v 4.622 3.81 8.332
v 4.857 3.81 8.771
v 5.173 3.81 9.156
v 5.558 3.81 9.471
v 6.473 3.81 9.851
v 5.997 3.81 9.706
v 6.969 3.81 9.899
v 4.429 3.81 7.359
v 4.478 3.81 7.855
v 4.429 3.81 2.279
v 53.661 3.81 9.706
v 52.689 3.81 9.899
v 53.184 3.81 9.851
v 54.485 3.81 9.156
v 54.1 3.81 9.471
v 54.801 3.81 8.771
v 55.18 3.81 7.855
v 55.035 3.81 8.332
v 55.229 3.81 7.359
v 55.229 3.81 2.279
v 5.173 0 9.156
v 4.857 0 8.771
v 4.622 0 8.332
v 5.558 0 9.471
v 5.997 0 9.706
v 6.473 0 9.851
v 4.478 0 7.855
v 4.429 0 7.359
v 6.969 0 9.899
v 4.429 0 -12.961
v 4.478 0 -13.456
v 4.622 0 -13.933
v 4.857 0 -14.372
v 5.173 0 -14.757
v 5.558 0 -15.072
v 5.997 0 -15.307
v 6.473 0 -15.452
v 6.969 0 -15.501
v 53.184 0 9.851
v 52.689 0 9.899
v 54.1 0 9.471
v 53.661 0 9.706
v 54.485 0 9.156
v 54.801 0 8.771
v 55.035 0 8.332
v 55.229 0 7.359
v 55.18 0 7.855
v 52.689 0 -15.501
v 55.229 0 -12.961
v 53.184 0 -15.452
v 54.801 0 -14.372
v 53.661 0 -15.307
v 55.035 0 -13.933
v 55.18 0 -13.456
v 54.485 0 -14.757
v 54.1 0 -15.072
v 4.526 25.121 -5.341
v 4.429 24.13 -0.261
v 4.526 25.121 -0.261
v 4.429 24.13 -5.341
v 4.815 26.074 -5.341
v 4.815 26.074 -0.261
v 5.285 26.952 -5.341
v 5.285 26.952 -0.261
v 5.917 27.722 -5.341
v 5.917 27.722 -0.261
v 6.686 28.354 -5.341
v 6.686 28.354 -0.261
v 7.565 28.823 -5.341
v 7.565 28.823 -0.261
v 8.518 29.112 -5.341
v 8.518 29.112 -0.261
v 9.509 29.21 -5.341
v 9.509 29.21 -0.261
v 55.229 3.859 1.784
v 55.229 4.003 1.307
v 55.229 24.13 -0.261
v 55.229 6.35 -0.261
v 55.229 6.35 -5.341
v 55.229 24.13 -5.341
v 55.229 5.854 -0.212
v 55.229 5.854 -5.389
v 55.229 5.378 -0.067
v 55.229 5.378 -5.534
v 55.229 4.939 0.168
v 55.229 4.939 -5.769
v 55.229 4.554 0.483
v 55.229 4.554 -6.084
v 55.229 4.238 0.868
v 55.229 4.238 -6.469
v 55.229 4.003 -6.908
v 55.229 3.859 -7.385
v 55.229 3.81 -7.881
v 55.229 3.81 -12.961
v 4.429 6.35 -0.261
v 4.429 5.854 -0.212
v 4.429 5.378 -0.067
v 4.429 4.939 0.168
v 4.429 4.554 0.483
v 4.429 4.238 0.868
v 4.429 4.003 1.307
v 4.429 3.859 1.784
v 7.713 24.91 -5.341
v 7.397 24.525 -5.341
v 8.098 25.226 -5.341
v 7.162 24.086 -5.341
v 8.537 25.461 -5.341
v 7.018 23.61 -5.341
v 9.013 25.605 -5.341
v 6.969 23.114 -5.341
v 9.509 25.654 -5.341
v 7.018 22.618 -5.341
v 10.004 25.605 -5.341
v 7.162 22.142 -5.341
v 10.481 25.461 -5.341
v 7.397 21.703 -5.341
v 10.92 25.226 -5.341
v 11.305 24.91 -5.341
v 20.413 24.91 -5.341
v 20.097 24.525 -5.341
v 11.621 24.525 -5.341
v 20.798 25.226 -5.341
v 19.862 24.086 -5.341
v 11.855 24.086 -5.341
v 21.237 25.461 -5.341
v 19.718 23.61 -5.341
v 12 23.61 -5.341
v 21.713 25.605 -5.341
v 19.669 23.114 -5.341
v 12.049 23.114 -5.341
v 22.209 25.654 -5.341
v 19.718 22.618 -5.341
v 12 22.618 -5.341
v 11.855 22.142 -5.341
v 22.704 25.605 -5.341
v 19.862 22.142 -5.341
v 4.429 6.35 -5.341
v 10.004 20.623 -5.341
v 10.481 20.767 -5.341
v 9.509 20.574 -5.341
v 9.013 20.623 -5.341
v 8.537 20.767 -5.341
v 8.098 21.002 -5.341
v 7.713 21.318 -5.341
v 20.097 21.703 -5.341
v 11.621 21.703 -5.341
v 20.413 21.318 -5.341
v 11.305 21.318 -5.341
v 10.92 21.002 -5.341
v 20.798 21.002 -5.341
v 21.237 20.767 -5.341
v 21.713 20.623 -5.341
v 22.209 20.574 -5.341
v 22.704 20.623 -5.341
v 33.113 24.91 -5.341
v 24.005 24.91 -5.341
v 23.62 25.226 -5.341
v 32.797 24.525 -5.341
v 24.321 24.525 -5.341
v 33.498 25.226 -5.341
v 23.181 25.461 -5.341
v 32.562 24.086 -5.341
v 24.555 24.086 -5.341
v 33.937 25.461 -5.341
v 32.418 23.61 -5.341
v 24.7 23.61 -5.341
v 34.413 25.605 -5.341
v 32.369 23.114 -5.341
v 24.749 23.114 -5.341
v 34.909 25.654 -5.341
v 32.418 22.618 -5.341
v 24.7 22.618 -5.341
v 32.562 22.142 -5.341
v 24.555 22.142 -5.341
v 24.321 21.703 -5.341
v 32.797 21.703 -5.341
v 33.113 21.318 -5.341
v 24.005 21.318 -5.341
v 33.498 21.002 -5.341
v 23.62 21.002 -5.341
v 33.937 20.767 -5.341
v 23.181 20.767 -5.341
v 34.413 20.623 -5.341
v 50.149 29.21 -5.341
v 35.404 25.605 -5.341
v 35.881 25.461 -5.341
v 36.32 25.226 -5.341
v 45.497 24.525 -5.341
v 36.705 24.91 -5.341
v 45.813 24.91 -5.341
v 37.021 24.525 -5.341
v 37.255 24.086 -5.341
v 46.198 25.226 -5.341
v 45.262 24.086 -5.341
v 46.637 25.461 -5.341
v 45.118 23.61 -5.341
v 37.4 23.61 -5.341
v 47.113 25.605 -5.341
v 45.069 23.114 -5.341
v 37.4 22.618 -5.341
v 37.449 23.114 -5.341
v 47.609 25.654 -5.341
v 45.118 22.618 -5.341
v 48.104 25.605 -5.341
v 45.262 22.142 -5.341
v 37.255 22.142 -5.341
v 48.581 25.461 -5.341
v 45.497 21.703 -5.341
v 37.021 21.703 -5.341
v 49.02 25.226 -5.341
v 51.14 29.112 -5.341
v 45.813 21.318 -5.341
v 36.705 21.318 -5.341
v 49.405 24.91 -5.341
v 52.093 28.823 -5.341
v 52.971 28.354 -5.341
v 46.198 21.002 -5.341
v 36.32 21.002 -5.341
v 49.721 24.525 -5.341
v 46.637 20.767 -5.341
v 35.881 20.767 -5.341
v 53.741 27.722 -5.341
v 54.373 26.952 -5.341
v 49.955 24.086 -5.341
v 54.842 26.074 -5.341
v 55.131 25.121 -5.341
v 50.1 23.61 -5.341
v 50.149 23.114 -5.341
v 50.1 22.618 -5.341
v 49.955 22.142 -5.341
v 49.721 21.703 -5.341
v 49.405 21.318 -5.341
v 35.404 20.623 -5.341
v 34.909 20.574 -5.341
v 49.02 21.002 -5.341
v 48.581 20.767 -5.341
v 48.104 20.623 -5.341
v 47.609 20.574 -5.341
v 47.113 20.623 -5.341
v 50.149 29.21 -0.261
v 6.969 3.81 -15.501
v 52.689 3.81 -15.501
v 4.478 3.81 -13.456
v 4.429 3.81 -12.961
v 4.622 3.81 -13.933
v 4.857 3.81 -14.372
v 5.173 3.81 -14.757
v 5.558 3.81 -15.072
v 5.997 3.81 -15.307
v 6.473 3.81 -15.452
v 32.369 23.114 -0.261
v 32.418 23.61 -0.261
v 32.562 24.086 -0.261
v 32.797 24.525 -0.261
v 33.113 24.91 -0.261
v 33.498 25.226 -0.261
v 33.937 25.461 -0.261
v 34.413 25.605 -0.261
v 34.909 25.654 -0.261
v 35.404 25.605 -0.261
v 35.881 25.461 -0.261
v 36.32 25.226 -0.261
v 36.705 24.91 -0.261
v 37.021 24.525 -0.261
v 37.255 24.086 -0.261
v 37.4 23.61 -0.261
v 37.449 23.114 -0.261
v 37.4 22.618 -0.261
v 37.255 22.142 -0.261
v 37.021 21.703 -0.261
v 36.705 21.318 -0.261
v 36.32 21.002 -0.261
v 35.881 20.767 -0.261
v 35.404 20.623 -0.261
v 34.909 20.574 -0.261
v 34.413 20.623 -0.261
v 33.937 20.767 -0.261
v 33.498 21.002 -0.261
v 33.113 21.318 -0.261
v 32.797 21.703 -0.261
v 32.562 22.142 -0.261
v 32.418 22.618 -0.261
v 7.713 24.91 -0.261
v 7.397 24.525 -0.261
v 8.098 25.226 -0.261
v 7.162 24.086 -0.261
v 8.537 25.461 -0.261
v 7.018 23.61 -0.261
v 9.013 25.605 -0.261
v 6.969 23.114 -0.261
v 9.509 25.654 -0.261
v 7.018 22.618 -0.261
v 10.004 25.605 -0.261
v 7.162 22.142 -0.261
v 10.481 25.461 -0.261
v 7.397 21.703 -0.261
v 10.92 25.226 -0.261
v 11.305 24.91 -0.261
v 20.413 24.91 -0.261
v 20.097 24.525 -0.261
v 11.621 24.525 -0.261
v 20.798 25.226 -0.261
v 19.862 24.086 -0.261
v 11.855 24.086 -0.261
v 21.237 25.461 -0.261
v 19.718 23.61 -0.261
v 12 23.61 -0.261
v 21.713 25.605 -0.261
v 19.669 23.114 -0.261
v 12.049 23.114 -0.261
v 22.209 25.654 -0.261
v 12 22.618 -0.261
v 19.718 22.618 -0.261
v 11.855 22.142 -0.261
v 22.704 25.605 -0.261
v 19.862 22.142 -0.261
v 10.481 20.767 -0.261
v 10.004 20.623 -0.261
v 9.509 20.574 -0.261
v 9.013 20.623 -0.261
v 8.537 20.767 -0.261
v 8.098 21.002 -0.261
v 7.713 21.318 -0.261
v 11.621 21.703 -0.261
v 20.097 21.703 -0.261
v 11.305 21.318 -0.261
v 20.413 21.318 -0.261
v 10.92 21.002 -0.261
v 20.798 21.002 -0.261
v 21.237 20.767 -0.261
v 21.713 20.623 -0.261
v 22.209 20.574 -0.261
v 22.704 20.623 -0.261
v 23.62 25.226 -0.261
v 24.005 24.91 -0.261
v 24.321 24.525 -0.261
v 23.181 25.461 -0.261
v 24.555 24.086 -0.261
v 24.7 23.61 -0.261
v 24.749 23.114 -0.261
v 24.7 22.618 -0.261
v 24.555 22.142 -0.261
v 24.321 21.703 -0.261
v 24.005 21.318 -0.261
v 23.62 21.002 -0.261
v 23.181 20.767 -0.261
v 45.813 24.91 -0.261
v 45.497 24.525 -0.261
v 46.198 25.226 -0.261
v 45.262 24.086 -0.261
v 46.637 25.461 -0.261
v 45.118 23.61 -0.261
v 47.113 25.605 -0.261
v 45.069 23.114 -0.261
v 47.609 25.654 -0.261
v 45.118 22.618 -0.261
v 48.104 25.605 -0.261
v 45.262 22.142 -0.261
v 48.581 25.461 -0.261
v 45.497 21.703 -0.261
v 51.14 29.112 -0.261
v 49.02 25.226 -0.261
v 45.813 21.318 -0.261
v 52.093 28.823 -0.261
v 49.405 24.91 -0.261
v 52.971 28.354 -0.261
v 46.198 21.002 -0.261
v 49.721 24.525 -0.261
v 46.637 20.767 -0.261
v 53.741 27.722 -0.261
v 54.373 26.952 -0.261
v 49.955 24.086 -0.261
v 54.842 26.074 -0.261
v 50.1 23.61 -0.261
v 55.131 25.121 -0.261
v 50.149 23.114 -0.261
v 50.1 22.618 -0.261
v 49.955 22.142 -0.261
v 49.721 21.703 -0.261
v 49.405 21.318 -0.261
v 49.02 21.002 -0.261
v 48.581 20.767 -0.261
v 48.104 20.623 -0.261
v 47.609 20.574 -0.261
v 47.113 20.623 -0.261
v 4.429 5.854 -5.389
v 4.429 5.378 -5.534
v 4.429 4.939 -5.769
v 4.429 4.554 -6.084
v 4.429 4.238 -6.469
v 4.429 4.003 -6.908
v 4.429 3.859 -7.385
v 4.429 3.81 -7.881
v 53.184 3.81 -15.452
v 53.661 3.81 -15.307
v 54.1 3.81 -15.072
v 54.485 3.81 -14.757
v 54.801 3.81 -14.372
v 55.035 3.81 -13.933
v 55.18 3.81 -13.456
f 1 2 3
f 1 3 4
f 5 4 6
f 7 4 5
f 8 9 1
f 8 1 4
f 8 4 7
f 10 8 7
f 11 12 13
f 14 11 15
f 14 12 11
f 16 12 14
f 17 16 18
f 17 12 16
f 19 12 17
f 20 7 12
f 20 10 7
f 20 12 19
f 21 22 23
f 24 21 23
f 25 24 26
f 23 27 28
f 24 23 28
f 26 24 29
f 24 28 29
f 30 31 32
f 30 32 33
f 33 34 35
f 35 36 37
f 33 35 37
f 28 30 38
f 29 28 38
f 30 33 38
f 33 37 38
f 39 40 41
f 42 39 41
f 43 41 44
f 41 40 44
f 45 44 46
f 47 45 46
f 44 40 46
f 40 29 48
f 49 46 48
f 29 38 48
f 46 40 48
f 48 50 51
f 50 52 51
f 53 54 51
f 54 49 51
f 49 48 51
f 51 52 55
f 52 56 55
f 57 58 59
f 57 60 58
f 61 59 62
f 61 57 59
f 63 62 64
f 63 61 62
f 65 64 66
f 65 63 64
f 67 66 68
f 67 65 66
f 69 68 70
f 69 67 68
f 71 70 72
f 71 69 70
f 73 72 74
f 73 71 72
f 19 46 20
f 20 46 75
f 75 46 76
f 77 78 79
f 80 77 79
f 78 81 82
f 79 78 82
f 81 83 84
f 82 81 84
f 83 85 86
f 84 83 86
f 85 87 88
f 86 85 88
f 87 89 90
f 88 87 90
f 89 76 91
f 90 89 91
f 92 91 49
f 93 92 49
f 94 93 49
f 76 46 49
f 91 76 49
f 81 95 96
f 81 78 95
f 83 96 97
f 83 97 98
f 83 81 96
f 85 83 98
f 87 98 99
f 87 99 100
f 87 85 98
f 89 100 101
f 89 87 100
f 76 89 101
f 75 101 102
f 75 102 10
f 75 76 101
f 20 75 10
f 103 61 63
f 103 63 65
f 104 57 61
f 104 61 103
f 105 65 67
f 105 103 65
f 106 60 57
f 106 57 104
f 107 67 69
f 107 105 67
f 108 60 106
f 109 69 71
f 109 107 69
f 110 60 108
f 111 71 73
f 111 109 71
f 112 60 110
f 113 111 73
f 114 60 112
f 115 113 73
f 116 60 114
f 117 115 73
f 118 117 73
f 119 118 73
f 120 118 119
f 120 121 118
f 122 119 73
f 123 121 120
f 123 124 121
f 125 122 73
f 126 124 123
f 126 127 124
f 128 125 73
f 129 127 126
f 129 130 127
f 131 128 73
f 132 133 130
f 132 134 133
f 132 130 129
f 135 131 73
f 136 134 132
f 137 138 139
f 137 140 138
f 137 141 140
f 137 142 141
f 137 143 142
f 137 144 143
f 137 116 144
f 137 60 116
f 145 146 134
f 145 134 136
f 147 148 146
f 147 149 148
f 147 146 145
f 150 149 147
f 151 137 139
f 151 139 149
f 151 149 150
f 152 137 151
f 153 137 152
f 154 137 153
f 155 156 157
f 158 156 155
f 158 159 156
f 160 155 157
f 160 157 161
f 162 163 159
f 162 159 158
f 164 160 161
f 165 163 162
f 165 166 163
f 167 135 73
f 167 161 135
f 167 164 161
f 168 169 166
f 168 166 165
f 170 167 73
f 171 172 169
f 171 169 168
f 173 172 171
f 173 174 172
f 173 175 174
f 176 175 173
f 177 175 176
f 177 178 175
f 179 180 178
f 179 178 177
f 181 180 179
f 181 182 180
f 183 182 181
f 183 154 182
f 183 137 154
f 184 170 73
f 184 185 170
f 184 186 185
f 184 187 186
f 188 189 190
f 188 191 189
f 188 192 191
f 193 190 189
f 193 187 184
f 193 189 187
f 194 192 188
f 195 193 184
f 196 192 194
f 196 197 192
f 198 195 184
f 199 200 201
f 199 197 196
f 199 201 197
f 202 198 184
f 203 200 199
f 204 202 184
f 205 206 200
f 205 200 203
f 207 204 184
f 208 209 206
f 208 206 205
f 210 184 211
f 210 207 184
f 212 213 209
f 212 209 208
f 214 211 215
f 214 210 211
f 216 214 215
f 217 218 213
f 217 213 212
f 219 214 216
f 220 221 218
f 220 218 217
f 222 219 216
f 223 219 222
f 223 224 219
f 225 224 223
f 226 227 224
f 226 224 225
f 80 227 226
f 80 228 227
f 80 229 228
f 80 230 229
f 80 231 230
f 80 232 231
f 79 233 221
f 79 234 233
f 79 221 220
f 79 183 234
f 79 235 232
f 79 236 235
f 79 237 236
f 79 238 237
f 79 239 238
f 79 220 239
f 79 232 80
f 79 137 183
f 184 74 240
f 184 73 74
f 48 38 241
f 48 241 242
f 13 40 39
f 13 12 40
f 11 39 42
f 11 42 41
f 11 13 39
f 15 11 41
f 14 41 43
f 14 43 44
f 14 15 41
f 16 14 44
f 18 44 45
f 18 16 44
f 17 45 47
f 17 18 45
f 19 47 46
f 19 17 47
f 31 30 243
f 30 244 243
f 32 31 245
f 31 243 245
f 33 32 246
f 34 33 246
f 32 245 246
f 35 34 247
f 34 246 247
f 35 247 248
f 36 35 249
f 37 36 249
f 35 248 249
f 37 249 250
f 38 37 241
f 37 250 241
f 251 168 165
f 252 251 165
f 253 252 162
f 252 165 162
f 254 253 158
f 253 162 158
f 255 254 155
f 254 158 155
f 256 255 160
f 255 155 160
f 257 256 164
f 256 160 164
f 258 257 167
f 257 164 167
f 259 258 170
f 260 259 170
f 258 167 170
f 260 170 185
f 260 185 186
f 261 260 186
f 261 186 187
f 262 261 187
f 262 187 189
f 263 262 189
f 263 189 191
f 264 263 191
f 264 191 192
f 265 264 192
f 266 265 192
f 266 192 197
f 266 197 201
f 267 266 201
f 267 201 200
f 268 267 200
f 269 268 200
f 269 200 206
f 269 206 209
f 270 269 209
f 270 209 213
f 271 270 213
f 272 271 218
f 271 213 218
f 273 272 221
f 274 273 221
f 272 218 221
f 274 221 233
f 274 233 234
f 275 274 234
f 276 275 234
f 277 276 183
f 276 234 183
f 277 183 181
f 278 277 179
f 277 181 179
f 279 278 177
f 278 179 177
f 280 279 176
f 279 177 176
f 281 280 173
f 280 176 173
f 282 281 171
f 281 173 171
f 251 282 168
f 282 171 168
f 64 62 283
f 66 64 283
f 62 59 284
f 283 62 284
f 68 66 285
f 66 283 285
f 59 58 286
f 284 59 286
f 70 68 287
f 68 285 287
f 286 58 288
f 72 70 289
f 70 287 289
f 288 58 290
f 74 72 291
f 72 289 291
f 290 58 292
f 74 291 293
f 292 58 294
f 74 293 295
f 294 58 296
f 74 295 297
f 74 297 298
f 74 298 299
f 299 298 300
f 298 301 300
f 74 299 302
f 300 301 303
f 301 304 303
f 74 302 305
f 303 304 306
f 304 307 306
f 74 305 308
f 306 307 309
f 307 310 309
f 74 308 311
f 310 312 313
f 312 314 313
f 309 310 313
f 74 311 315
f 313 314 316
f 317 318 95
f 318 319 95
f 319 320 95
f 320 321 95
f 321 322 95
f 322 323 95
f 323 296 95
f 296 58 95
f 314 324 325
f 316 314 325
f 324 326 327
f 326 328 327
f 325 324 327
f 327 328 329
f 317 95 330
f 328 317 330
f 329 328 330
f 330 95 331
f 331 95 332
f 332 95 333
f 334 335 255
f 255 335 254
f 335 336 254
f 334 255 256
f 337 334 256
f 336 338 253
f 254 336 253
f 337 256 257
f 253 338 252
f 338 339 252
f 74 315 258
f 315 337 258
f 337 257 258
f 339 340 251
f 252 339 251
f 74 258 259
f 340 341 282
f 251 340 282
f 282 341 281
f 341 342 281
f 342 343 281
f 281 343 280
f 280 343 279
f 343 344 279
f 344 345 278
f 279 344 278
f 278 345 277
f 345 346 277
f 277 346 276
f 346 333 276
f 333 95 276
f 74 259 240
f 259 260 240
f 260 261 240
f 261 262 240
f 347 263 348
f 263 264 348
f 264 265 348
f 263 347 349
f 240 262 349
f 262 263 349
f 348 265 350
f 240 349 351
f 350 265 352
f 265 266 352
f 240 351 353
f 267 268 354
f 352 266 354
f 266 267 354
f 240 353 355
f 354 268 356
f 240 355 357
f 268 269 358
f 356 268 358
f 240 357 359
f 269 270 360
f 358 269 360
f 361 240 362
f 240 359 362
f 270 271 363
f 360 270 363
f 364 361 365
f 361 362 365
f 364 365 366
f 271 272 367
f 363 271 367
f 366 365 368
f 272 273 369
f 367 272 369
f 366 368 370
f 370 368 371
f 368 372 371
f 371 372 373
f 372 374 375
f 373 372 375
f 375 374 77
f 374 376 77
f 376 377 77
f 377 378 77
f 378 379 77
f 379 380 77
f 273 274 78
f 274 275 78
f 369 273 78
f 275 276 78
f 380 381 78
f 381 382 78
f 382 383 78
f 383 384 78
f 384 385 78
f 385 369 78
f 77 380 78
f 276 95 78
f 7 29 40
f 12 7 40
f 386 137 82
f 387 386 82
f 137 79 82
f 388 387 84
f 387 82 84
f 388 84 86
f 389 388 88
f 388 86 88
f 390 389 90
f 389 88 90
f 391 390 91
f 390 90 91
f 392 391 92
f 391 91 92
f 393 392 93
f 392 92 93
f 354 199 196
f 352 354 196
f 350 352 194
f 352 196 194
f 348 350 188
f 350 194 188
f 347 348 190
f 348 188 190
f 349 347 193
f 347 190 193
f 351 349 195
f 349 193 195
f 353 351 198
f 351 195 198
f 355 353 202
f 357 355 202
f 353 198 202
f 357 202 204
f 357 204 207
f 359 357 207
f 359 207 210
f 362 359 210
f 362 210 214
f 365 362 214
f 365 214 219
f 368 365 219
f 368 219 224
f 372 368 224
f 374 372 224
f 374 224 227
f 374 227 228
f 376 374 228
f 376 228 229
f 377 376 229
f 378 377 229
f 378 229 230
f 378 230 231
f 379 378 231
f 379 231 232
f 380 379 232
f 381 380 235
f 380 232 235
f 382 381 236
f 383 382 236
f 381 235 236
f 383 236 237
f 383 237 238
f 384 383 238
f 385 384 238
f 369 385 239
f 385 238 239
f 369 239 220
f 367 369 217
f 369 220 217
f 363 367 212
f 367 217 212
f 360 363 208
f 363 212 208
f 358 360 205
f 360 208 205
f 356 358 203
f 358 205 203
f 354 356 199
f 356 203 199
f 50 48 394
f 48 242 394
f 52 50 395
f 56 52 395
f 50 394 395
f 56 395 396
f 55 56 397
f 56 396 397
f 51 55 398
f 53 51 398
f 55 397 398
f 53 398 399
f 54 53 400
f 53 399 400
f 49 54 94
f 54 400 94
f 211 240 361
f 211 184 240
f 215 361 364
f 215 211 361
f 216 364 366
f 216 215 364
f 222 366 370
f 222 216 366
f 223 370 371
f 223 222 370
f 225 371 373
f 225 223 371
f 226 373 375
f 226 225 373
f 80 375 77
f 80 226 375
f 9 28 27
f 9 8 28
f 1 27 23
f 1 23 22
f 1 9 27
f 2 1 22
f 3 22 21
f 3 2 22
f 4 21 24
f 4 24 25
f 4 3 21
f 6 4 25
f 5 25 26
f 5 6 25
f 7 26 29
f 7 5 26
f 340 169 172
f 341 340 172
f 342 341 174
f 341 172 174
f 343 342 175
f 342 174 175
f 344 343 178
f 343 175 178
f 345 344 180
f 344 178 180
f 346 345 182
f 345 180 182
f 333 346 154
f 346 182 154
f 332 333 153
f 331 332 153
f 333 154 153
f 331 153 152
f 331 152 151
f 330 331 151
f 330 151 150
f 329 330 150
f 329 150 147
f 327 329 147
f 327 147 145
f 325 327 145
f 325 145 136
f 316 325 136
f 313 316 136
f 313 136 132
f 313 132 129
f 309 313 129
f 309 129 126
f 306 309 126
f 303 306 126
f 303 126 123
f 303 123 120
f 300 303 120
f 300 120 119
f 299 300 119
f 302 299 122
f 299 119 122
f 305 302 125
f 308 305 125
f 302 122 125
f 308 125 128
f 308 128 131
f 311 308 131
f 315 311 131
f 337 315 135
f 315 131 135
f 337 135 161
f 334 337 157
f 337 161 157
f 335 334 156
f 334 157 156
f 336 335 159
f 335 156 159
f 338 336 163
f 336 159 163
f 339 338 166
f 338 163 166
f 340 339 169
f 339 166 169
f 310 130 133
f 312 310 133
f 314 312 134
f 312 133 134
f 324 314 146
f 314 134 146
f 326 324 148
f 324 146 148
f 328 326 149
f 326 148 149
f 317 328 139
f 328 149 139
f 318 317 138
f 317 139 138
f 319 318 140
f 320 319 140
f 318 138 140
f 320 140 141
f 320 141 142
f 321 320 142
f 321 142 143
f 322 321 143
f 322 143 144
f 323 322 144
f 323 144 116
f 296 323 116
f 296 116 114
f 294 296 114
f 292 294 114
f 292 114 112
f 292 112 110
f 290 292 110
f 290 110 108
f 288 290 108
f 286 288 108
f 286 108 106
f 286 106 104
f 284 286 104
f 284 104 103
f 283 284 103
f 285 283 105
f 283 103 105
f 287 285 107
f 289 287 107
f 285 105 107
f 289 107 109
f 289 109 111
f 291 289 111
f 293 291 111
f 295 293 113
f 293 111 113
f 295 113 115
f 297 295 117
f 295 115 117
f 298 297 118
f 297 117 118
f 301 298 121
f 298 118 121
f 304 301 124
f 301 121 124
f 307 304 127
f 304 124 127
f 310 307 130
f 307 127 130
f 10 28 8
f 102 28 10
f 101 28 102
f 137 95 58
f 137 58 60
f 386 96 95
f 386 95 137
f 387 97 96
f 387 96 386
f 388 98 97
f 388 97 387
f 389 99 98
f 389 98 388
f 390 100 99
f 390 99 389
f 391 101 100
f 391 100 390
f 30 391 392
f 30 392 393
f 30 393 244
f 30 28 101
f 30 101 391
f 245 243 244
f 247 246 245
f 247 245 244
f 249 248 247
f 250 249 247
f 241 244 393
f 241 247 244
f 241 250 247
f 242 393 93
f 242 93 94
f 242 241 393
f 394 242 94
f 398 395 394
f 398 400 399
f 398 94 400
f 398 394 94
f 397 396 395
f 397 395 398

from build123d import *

# Parameters (mm, degrees)
SKETCH1_W           = 50.8
SKETCH1_H           = 25.4
BOSS_EXTRUDE1_DEPTH = 3.81
SKETCH2_W           = 50.8
SKETCH2_H           = 5.08
BOSS_EXTRUDE2_DEPTH = 25.4
CUT_EXTRUDE1_DEPTH  = 25.4
FILLET1_R           = 5.08
FILLET2_R           = 2.54
FILLET3_R           = 2.54


with BuildPart() as part:
    # Sketch1 → Boss-Extrude1 (new body)
    with BuildSketch(Plane(origin=(0, 0, 0), x_dir=(1, 0, 0), z_dir=(0, 1, 0))):
        with Locations((29.828717949, 2.800512821)):
            Rectangle(SKETCH1_W, SKETCH1_H)
    extrude(amount=BOSS_EXTRUDE1_DEPTH)

    # Sketch2 → Boss-Extrude2 (add)
    with BuildSketch(Plane(origin=(0, 3.81, 0), x_dir=(1, 0, 0), z_dir=(0, 1, 0))):
        with Locations((29.828717949, 2.800512821)):
            Rectangle(SKETCH2_W, SKETCH2_H)
    extrude(amount=BOSS_EXTRUDE2_DEPTH)

    # Sketch3 → Cut-Extrude1 (cut)
    with BuildSketch(Plane(origin=(0, 0, -5.340512821), x_dir=(-1, 0, 0), z_dir=(0, 0, -1))):
        with BuildLine():
            ThreePointArc((-6.968717949, 23.114), (-9.508717949, 25.654), (-12.048717949, 23.114))
            Line((-12.048717949, 23.114), (-6.968717949, 23.114))
        make_face()
        with BuildLine():
            Line((-6.968717949, 23.114), (-12.048717949, 23.114))
            ThreePointArc((-12.048717949, 23.114), (-9.508717949, 20.574), (-6.968717949, 23.114))
        make_face()
        with BuildLine():
            ThreePointArc((-19.668717949, 23.114), (-22.208717949, 25.654), (-24.748717949, 23.114))
            Line((-24.748717949, 23.114), (-19.668717949, 23.114))
        make_face()
        with BuildLine():
            Line((-19.668717949, 23.114), (-24.748717949, 23.114))
            ThreePointArc((-24.748717949, 23.114), (-22.208717949, 20.574), (-19.668717949, 23.114))
        make_face()
        with BuildLine():
            ThreePointArc((-37.448717949, 23.114), (-34.908717949, 20.574), (-32.368717949, 23.114))
            Line((-32.368717949, 23.114), (-37.448717949, 23.114))
        make_face()
        with BuildLine():
            Line((-37.448717949, 23.114), (-32.368717949, 23.114))
            ThreePointArc((-32.368717949, 23.114), (-34.908717949, 25.654), (-37.448717949, 23.114))
        make_face()
        with BuildLine():
            ThreePointArc((-50.148717949, 23.114), (-47.608717949, 20.574), (-45.068717949, 23.114))
            Line((-45.068717949, 23.114), (-50.148717949, 23.114))
        make_face()
        with BuildLine():
            Line((-50.148717949, 23.114), (-45.068717949, 23.114))
            ThreePointArc((-45.068717949, 23.114), (-47.608717949, 25.654), (-50.148717949, 23.114))
        make_face()
    extrude(amount=-CUT_EXTRUDE1_DEPTH, mode=Mode.SUBTRACT)

    # Fillet1
    fillet1_edges = [part.edges().sort_by_distance(p)[0] for p in [
        (4.428717949, 29.21, -2.800512821),
        (55.228717949, 29.21, -2.800512821),
    ]]
    fillet(fillet1_edges, radius=FILLET1_R)

    # Fillet2
    fillet2_edges = [part.edges().sort_by_distance(p)[0] for p in [
        (29.828717949, 3.81, -0.260512821),
        (29.828717949, 3.81, -5.340512821),
    ]]
    fillet(fillet2_edges, radius=FILLET2_R)

    # Fillet3
    fillet3_edges = [part.edges().sort_by_distance(p)[0] for p in [
        (4.428717949, 1.905, -15.500512821),
        (55.228717949, 1.905, -15.500512821),
        (55.228717949, 1.905, 9.899487179),
        (4.428717949, 1.905, 9.899487179),
    ]]
    fillet(fillet3_edges, radius=FILLET3_R)


solid = part.part
